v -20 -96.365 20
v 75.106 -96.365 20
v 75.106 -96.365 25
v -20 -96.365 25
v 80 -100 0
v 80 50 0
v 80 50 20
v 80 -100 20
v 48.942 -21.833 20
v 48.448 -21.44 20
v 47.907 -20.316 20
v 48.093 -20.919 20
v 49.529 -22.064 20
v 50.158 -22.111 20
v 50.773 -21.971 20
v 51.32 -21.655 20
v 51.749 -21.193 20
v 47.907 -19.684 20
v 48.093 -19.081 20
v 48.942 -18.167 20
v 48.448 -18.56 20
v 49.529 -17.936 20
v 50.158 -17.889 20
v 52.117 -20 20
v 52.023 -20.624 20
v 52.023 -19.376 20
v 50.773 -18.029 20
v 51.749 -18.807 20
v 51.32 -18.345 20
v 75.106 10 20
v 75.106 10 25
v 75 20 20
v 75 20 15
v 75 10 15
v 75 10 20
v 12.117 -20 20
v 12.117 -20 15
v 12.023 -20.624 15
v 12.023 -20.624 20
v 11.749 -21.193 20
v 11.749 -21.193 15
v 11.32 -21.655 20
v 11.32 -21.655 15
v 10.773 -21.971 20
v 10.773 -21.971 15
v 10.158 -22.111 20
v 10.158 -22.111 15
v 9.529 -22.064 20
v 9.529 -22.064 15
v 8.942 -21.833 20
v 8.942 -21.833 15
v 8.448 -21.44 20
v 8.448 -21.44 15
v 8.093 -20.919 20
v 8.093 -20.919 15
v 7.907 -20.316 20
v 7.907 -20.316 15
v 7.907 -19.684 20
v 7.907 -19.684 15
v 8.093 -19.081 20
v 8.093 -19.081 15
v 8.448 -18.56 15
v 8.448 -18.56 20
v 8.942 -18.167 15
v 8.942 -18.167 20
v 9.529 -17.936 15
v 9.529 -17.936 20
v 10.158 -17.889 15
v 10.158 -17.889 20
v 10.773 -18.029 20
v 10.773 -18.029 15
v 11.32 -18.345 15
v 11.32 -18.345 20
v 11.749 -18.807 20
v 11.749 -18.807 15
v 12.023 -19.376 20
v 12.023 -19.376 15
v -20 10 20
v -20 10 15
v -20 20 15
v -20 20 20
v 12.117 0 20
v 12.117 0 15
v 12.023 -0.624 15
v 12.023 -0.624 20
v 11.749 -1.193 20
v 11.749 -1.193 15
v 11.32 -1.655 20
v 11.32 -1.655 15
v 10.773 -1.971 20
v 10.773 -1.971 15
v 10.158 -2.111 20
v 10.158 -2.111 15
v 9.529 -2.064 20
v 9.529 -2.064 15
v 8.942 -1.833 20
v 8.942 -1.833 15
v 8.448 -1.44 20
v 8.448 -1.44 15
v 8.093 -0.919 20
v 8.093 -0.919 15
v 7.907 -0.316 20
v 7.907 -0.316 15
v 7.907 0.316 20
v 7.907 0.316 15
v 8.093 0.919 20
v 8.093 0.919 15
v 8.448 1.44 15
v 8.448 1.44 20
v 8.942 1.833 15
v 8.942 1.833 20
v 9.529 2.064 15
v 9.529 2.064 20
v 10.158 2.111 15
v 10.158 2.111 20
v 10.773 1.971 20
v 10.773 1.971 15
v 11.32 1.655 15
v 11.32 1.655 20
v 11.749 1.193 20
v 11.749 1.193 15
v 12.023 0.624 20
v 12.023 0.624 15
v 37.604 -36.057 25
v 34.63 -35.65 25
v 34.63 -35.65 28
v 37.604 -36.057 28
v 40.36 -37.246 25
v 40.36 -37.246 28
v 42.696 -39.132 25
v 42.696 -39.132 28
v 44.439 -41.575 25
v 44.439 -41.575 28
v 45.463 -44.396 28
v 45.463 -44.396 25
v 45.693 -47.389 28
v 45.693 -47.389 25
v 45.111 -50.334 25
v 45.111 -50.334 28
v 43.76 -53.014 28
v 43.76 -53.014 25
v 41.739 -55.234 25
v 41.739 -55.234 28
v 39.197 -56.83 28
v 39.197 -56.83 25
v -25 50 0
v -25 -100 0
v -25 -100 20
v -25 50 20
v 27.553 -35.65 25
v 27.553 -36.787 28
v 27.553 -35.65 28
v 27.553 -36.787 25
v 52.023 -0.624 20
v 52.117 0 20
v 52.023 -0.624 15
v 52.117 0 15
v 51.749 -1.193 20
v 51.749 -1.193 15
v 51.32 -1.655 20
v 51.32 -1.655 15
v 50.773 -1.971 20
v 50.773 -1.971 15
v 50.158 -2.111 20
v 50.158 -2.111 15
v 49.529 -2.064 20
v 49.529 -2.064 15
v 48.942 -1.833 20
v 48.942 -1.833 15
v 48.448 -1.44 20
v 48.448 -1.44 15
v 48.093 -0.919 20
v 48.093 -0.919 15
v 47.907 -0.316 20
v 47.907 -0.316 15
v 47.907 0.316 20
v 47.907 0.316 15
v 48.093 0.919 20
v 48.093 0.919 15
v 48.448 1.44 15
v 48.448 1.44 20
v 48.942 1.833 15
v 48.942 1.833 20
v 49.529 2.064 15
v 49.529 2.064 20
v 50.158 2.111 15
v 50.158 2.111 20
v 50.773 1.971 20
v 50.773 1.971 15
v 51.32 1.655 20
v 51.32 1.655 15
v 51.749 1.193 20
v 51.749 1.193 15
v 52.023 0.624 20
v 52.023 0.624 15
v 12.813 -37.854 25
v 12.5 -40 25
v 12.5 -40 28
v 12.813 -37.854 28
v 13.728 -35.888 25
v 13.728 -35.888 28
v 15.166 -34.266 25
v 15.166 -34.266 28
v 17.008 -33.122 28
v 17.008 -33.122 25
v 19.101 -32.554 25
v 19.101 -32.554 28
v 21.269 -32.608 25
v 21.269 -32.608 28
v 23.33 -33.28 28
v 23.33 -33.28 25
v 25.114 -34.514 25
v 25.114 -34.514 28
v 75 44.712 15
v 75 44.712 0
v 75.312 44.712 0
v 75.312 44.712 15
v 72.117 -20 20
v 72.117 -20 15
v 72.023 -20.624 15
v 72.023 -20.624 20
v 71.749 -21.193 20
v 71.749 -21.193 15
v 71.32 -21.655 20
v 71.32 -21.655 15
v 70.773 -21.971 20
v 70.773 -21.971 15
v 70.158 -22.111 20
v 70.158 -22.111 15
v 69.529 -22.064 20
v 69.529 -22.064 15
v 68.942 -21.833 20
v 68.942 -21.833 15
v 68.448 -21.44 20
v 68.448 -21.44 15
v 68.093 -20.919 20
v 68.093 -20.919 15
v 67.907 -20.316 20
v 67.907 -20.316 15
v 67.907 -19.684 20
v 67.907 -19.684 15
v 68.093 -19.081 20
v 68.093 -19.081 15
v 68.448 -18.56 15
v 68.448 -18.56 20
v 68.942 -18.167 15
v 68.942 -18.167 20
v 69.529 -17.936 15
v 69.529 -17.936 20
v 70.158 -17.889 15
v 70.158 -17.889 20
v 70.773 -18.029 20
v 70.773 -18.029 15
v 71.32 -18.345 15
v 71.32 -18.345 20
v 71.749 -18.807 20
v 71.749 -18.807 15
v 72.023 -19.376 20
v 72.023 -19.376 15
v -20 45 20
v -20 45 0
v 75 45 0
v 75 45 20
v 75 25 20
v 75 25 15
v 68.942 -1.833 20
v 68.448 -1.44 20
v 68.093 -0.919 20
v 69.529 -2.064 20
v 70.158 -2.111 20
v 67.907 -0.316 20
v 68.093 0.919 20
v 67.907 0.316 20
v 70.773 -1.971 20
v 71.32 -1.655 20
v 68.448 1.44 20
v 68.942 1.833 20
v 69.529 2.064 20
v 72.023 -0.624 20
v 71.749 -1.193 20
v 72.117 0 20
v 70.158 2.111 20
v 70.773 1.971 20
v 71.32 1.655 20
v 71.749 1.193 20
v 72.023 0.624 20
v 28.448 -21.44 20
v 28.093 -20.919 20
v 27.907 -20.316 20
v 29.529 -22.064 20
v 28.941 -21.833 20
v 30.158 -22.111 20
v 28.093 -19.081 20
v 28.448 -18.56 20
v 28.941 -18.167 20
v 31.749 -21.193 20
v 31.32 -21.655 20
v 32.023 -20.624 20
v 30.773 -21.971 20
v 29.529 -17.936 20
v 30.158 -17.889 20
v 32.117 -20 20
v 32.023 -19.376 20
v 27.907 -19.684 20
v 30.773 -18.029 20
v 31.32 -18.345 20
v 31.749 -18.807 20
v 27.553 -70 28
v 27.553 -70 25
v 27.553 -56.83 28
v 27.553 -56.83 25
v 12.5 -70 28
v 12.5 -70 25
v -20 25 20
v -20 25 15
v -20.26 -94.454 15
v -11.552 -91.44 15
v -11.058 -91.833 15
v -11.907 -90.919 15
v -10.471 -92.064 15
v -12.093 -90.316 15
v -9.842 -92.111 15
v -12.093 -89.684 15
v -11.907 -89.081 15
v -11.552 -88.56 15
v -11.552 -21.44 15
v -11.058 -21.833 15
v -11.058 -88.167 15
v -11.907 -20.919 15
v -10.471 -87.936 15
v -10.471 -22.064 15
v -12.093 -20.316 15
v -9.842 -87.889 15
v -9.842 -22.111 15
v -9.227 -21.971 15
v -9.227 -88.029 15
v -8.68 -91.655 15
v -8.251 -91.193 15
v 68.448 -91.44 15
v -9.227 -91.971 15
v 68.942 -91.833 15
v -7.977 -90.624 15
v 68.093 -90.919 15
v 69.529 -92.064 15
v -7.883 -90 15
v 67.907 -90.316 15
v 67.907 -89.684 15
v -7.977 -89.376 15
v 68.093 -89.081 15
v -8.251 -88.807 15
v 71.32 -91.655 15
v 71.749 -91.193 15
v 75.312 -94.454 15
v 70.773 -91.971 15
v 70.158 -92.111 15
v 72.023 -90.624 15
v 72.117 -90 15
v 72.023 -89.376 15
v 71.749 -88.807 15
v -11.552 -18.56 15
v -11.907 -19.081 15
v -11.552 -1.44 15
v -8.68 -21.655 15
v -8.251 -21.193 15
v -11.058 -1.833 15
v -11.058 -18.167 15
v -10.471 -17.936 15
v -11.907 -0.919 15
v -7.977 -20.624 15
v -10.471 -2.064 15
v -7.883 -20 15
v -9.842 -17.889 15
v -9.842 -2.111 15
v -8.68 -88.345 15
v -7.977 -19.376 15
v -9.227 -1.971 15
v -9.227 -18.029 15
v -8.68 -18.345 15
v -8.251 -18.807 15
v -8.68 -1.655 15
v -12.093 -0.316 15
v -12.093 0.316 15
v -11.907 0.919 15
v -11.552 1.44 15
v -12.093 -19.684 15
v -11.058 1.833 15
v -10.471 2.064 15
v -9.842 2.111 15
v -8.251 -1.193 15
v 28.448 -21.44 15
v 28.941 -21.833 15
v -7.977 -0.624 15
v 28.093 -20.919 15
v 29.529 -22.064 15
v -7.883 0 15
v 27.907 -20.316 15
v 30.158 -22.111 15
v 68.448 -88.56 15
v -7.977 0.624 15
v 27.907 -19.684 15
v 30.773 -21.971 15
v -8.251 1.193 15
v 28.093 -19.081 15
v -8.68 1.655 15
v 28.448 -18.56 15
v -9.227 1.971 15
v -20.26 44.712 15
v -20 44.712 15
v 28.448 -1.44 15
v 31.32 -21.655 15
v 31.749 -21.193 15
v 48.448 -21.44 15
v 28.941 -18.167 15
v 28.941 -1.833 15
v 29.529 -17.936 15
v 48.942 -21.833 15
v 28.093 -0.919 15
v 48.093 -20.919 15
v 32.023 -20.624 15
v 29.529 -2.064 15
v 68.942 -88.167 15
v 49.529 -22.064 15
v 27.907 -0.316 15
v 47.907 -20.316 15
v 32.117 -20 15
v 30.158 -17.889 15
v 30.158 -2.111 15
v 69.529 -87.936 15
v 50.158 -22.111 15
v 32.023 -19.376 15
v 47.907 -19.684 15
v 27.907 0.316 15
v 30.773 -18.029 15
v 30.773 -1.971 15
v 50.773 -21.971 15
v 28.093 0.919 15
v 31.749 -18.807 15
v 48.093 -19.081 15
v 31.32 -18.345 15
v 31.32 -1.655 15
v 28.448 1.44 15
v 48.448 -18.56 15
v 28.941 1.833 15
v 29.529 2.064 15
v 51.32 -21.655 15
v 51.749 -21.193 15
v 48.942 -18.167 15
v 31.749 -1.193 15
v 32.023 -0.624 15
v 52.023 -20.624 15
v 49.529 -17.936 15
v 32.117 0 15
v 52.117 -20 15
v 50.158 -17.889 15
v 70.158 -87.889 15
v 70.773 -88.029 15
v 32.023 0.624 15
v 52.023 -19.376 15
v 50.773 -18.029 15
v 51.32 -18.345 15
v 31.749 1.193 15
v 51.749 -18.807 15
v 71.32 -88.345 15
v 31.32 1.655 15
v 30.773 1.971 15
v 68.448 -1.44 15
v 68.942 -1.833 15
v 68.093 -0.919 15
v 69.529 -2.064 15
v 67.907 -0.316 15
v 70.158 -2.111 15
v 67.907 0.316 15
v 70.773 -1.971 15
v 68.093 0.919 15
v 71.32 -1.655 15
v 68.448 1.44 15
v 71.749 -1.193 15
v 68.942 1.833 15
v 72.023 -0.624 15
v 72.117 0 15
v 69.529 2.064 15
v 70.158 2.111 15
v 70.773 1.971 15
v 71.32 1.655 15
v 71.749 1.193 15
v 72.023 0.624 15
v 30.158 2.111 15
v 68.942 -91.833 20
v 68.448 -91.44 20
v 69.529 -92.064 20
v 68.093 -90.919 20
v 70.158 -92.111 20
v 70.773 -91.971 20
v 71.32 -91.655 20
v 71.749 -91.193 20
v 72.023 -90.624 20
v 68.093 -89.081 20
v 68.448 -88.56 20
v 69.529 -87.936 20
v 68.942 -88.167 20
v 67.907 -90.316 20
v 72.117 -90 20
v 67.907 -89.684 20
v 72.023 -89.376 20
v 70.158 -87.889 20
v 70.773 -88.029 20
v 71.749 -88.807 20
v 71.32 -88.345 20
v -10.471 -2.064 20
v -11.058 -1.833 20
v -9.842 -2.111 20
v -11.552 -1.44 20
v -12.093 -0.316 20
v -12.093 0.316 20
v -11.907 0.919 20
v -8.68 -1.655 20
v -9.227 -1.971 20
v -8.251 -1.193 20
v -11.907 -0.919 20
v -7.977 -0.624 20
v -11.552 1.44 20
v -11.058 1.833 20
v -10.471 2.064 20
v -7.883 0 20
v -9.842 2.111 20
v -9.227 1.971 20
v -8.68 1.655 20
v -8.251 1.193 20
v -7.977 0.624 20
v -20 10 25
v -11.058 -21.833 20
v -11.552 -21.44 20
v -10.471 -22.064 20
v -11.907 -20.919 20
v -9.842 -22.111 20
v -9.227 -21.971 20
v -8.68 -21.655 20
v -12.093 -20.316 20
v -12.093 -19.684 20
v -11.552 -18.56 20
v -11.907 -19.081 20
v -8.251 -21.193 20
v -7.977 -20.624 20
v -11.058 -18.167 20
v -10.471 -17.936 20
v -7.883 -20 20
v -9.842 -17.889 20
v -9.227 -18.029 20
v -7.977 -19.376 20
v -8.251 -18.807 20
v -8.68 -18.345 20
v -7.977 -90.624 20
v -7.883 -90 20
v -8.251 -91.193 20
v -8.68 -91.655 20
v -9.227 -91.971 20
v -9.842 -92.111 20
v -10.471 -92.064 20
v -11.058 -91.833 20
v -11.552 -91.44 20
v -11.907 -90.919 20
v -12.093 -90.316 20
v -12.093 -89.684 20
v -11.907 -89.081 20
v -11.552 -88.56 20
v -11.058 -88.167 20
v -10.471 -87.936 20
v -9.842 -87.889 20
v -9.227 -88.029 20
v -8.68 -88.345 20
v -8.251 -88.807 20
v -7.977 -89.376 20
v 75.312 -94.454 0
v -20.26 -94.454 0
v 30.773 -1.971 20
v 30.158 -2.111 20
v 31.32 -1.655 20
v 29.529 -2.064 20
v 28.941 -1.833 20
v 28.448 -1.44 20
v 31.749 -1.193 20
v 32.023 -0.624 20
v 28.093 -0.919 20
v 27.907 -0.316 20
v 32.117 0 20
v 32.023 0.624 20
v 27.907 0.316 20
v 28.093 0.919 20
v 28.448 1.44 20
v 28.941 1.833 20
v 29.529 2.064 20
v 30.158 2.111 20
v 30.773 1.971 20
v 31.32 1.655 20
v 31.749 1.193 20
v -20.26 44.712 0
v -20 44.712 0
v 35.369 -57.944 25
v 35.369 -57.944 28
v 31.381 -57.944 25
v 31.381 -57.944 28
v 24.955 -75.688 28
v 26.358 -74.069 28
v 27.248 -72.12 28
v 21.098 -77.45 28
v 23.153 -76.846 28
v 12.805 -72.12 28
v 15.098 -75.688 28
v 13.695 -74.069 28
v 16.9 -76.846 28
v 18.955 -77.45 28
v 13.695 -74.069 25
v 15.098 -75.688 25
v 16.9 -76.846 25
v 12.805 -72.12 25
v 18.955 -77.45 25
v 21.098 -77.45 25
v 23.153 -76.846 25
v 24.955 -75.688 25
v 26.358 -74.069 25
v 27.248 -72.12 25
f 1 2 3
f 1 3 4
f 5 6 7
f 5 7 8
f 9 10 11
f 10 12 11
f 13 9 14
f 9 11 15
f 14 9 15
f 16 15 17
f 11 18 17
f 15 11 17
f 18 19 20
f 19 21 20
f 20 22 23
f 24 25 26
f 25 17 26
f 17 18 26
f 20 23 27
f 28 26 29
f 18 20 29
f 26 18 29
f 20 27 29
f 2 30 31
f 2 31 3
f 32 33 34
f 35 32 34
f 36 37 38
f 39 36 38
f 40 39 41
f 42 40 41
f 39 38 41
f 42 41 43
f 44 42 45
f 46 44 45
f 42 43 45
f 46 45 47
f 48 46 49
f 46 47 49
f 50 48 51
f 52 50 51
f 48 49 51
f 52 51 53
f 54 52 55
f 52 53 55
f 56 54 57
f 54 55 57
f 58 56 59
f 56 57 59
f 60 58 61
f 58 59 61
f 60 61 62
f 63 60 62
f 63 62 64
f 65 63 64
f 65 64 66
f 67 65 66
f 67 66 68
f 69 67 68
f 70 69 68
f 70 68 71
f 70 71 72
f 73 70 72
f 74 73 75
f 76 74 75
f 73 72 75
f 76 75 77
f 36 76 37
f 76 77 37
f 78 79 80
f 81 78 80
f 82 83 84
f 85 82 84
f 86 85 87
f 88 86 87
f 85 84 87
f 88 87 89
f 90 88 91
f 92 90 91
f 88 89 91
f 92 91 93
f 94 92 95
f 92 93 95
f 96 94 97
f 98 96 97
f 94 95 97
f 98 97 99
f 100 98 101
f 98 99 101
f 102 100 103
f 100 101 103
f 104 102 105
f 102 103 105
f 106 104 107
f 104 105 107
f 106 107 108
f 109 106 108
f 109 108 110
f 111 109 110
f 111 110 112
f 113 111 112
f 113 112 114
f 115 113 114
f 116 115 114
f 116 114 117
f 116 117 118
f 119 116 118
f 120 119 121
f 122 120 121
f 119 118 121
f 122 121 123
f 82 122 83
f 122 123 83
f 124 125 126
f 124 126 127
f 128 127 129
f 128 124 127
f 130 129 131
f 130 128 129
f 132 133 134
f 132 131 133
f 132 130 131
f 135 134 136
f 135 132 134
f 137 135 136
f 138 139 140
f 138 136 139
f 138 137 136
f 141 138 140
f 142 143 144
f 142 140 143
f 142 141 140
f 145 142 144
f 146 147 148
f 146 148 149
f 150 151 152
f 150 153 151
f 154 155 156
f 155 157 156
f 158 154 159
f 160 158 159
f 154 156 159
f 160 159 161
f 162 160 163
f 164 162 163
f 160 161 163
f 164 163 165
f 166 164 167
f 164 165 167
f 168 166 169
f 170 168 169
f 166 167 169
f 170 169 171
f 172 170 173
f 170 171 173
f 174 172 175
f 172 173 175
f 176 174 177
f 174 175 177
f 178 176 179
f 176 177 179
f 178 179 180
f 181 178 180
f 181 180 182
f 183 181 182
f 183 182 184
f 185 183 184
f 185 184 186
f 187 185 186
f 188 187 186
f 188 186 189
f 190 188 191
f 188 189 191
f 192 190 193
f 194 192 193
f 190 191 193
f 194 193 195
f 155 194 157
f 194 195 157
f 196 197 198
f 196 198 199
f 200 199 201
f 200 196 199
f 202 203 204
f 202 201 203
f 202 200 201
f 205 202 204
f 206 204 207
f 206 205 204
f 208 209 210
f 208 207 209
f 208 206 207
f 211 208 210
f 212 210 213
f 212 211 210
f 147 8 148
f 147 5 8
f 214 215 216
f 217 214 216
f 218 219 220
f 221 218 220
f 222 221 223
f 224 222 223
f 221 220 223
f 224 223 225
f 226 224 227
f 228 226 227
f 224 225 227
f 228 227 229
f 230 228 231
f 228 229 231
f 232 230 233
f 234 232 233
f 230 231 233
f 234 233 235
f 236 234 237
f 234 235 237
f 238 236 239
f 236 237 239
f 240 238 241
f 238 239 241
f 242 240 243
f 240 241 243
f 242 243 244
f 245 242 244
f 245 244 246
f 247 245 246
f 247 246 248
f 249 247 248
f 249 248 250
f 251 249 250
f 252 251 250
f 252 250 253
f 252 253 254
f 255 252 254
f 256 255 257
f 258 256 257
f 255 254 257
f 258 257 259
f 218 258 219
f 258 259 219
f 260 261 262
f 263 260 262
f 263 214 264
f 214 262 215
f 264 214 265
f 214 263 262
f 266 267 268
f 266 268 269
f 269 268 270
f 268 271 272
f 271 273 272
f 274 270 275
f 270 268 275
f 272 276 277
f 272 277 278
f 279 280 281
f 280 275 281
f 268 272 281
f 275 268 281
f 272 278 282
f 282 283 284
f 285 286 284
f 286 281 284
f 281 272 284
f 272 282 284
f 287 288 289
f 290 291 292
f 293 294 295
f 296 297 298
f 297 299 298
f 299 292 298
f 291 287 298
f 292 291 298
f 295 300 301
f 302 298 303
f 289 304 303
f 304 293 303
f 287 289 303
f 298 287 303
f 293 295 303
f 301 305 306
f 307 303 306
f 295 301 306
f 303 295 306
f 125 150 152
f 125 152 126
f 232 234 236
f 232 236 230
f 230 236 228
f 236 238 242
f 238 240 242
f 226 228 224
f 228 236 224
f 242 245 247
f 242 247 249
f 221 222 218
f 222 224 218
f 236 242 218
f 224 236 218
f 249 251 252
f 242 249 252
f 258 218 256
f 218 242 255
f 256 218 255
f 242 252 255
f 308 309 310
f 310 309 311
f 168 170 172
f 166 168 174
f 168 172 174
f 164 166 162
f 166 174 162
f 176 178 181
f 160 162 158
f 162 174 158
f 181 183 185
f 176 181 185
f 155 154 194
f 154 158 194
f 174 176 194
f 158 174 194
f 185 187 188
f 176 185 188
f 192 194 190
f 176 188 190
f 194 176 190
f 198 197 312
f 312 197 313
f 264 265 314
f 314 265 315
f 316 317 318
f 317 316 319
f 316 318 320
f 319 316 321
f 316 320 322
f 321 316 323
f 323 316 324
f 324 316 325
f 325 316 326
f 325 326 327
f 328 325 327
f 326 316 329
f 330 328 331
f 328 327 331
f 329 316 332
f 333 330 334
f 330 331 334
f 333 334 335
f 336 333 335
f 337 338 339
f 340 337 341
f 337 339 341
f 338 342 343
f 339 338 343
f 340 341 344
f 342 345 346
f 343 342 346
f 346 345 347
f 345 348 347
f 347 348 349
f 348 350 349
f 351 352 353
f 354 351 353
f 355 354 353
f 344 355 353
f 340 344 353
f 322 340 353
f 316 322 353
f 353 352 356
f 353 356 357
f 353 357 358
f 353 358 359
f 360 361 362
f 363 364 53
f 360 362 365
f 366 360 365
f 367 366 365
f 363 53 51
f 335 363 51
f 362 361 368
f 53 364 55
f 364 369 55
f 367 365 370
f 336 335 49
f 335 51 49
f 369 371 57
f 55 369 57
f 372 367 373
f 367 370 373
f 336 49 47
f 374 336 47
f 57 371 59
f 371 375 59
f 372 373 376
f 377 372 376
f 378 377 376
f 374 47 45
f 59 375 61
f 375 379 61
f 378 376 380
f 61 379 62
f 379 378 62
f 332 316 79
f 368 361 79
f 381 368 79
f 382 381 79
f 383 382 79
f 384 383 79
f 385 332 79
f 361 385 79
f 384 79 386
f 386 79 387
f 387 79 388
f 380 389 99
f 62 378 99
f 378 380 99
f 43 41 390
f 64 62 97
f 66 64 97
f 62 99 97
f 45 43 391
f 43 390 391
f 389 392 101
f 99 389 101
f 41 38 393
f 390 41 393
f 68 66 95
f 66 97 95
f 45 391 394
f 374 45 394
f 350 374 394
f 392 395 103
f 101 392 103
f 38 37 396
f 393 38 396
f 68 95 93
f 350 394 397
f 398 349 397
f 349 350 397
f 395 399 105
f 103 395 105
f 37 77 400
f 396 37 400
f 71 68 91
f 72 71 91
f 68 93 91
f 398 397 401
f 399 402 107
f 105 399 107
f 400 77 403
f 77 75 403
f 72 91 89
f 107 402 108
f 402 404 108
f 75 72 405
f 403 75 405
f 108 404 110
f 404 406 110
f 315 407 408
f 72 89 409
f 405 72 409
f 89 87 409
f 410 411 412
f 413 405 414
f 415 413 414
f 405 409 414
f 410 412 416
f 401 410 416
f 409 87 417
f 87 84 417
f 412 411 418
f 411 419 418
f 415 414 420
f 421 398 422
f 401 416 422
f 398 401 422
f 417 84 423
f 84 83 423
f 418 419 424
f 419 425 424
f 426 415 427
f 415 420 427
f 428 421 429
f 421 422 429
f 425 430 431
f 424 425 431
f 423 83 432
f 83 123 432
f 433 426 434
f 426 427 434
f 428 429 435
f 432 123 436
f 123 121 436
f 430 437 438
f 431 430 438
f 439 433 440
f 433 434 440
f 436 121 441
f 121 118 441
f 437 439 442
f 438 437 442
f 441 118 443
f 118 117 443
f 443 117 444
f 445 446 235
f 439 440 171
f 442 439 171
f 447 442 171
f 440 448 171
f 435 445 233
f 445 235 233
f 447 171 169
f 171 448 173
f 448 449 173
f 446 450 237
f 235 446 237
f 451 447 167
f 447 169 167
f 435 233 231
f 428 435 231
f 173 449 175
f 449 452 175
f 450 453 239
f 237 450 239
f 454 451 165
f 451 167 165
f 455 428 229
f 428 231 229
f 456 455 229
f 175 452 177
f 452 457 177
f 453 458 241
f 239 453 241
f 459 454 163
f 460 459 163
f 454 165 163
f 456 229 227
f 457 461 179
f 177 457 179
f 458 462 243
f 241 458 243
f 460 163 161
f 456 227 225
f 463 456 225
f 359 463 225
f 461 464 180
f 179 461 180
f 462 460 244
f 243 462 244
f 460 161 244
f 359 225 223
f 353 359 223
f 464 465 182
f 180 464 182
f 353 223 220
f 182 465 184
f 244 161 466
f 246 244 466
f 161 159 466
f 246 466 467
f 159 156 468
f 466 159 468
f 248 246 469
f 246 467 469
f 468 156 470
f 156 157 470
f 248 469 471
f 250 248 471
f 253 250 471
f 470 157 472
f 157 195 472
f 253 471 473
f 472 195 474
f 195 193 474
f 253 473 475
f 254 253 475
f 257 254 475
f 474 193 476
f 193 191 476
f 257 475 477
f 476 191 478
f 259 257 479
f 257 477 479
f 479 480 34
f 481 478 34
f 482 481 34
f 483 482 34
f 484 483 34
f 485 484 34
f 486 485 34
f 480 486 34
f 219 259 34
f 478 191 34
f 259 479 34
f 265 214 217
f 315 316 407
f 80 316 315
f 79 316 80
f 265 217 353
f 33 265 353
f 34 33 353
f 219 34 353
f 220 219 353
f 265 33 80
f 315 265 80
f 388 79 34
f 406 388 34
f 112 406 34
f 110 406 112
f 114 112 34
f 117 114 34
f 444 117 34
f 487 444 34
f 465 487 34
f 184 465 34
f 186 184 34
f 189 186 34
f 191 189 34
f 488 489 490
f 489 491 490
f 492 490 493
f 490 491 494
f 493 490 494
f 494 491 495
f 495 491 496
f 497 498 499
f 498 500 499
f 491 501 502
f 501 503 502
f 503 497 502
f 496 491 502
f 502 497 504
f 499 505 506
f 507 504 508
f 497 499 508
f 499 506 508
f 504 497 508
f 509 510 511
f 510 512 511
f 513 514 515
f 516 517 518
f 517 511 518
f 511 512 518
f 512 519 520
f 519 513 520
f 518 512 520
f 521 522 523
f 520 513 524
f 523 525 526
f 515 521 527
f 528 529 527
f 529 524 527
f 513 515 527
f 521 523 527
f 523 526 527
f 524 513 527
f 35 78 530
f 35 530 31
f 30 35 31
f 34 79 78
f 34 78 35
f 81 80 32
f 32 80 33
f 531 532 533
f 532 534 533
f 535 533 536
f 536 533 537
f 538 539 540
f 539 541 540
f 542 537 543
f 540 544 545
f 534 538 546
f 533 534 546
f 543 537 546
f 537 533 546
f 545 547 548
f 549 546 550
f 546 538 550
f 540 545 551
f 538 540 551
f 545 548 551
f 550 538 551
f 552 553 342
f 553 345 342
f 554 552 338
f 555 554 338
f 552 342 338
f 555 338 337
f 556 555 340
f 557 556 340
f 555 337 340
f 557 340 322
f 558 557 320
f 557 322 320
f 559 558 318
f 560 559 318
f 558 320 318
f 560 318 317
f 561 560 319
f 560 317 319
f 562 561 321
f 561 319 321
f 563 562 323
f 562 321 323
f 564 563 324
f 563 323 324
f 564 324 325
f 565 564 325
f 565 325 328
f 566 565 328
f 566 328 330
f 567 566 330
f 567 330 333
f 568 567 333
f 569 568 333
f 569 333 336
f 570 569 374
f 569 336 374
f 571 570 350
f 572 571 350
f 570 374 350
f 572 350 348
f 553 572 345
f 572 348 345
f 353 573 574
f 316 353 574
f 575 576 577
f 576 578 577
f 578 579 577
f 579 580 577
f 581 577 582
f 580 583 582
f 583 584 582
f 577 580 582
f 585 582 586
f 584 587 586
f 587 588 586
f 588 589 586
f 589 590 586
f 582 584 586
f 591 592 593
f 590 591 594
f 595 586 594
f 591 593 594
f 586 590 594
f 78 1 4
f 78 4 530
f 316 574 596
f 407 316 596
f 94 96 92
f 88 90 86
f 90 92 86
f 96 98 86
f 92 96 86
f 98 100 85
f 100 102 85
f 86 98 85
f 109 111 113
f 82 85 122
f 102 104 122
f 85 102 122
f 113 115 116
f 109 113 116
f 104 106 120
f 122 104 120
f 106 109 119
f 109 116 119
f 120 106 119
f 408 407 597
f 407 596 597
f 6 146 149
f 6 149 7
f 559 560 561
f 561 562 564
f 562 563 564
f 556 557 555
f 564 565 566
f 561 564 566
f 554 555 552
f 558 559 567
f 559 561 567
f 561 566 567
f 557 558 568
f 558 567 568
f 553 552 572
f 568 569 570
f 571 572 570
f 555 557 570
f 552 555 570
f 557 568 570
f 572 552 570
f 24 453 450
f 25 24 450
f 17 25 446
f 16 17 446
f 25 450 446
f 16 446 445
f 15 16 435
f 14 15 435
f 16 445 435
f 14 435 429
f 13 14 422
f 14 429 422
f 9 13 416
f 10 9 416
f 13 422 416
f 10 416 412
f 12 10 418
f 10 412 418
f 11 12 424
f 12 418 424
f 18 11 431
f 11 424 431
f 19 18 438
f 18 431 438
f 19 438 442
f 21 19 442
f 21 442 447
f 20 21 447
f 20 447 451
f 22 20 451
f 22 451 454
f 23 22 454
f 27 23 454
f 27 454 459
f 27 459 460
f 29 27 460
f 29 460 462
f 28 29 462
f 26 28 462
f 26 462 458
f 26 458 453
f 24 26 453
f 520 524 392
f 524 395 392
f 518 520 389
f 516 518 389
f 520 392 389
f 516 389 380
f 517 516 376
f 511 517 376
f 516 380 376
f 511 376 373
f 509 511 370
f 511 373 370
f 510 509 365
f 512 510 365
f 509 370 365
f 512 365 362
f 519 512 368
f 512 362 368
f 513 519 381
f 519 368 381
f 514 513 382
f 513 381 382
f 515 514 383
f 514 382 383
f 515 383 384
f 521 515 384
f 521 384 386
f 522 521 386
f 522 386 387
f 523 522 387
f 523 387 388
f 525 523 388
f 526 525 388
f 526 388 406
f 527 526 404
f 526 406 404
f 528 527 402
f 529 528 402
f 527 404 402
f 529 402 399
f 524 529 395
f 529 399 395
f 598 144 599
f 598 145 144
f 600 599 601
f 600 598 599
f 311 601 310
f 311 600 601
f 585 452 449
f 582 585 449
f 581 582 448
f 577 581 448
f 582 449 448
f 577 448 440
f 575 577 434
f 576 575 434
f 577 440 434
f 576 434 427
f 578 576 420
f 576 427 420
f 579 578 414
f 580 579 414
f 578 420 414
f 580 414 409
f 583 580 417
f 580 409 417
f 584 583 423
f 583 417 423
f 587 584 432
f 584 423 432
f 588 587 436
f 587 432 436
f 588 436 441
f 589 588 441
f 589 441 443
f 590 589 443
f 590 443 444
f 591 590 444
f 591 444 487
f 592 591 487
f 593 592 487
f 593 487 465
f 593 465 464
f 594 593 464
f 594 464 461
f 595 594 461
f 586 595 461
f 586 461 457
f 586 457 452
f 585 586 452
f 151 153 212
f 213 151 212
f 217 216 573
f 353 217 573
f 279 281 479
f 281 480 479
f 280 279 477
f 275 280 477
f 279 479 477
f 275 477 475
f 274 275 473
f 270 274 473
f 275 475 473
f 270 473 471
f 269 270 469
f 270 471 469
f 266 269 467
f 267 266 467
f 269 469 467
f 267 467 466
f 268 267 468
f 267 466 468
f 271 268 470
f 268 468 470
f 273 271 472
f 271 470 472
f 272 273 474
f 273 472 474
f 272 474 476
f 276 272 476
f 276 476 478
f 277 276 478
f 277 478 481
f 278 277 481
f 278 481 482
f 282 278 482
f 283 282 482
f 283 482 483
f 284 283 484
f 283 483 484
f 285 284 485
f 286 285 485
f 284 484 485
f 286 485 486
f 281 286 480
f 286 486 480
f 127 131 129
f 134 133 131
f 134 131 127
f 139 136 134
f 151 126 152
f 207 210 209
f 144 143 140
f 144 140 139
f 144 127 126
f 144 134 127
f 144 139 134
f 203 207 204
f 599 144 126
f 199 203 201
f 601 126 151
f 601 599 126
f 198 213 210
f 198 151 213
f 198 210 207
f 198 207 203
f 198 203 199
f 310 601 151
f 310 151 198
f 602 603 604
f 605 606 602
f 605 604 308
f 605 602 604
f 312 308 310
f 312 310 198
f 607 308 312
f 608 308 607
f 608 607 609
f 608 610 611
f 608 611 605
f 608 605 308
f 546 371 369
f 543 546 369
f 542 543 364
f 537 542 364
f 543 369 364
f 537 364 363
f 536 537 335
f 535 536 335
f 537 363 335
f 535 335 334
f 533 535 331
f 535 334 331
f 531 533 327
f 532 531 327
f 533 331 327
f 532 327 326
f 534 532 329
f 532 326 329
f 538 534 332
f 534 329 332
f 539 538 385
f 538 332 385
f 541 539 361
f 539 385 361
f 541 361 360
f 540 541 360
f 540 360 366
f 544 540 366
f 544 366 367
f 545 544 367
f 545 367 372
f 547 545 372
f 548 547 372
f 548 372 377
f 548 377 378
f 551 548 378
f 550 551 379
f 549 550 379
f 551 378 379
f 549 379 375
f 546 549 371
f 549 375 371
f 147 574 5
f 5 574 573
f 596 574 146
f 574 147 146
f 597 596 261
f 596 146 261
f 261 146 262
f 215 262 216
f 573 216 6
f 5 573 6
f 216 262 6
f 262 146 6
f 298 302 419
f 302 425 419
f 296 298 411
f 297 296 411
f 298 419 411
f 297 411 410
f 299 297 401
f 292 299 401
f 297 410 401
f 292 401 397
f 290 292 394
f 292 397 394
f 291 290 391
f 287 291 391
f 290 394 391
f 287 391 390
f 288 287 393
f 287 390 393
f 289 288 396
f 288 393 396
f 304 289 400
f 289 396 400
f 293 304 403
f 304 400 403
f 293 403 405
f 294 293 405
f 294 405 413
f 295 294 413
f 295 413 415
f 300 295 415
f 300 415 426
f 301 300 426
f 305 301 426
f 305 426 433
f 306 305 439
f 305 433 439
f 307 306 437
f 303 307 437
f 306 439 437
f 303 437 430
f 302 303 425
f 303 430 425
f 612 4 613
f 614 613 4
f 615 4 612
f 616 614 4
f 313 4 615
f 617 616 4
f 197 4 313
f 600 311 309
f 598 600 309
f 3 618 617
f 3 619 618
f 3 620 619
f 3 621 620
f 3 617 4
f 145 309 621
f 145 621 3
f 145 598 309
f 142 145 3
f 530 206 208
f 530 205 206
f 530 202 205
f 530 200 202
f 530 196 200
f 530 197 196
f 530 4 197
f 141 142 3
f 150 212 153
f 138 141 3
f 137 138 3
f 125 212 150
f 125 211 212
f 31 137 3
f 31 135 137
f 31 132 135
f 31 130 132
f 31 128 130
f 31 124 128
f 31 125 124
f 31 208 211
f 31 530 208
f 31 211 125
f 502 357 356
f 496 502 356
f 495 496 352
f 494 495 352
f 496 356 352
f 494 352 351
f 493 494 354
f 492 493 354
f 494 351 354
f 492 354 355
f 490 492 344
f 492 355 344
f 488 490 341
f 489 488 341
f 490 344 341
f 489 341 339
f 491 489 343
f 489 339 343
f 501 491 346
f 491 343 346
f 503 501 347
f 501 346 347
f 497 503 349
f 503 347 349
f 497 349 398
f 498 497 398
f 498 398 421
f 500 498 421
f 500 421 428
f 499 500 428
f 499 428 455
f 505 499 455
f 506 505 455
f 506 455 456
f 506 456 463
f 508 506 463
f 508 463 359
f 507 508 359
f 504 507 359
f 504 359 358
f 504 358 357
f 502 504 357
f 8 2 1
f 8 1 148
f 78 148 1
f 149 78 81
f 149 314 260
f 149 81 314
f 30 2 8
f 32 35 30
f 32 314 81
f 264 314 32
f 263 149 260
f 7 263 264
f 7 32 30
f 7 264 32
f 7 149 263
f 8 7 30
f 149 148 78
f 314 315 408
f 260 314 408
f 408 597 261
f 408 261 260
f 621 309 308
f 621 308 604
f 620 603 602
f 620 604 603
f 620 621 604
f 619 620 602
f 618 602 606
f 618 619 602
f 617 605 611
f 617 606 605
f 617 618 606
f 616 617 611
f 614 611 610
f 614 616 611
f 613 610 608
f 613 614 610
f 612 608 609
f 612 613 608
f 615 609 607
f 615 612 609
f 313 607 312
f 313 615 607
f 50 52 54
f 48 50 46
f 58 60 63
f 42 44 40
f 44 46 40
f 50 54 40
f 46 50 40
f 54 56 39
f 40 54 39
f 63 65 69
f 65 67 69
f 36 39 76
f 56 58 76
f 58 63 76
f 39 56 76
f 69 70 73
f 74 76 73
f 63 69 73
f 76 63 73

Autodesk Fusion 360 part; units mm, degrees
sketch "Sketch1" plane through (0, 0, 0) normal (0, 0, 1) x (1, 0, 0)
  line L0 (-25, 50) -> (80, 50)
  line L1 (80, 50) -> (80, -100)
  line L2 (80, -100) -> (-25, -100)
  line L3 (-25, -100) -> (-25, 50)
  line L4 (-20, 45) -> (75, 45)
  line L5 (75, 45) -> (75, 25)
  line L6 (75, 25) -> (-20, 25)
  line L7 (-20, 25) -> (-20, 45)
  line L8 (-20, 20) -> (75, 20)
  line L9 (75, 20) -> (75, 10)
  line L10 (75, 10) -> (-20, 10)
  line L11 (-20, 10) -> (-20, 20)
  dimension "d1" = 105
  dimension "d2" = 150
extrude "Extrude1" add sketch "Sketch1" along normal blind 20 makes body 1
sketch "Sketch2" plane through (0, 0, 0) normal (0, 0, 1) x (1, 0, 0)
  line L0 (-20.26, 44.7118) -> (75.3115, 44.7118)
  line L1 (75.3115, 44.7118) -> (75.3115, -94.4537)
  line L2 (75.3115, -94.4537) -> (-20.26, -94.4537)
  line L3 (-20.26, -94.4537) -> (-20.26, 44.7118)
extrude "Extrude2" cut sketch "Sketch2" along normal blind 15 bodies 1
sketch "Sketch3" plane through (0, 0, 0) normal (0, 0, 1) x (1, 0, 0)
  circle A0 centre (70, 0) radius 2.5
  circle A1 centre (-10, 0) radius 2.5
  circle A2 centre (70, -90) radius 2.5
  circle A3 centre (-10, -90) radius 2.5
  circle A4 centre (50, 0) radius 2.5
  circle A5 centre (50, -20) radius 2.5
  circle A6 centre (70, -20) radius 2.5
  circle A7 centre (10, 0) radius 2.5
  circle A8 centre (-10, -20) radius 2.5
  circle A9 centre (10, -20) radius 2.5
  circle A10 centre (30, 0) radius 2.5
  circle A11 centre (30, -20) radius 2.5
  dimension "d7" = 5
  dimension "d8" = 5
  dimension "d9" = 5
  dimension "d10" = 5
  dimension "d11" = 5
  dimension "d12" = 5
  dimension "d13" = 5
  dimension "d14" = 5
  dimension "d15" = 5
  dimension "d16" = 5
  dimension "d17" = 5
  dimension "d18" = 5
extrude "Extrude3" cut sketch "Sketch3" along normal blind 40 bodies 1
thread "Thread1" "ISO Metric profile 5.0 M5x0.8 M5x0.8 6H" major diameter 5.12 minor diameter 4.234 pitch 0.8 angle 60 resizes the face on face at (72.4969, -19.8754, 16.6667) on bodies 1
thread "Thread2" "ISO Metric profile 5.0 M5x0.8 M5x0.8 6H" major diameter 5.12 minor diameter 4.234 pitch 0.8 angle 60 resizes the face on face at (52.4969, -19.8754, 16.6667) on bodies 1
thread "Thread3" "ISO Metric profile 5.0 M5x0.8 M5x0.8 6H" major diameter 5.12 minor diameter 4.234 pitch 0.8 angle 60 resizes the face on face at (32.4969, -19.8754, 16.6667) on bodies 1
thread "Thread4" "ISO Metric profile 5.0 M5x0.8 M5x0.8 6H" major diameter 5.12 minor diameter 4.234 pitch 0.8 angle 60 resizes the face on face at (32.4876, 0.2489, 18.3333) on bodies 1
thread "Thread5" "ISO Metric profile 5.0 M5x0.8 M5x0.8 6H" major diameter 5.12 minor diameter 4.234 pitch 0.8 angle 60 resizes the face on face at (12.4876, 0.2489, 18.3333) on bodies 1
thread "Thread6" "ISO Metric profile 5.0 M5x0.8 M5x0.8 6H" major diameter 5.12 minor diameter 4.234 pitch 0.8 angle 60 resizes the face on face at (-7.5124, 0.2489, 18.3333) on bodies 1
thread "Thread7" "ISO Metric profile 5.0 M5x0.8 M5x0.8 6H" major diameter 5.12 minor diameter 4.234 pitch 0.8 angle 60 resizes the face on face at (-7.5031, -19.8754, 16.6667) on bodies 1
thread "Thread8" "ISO Metric profile 5.0 M5x0.8 M5x0.8 6H" major diameter 5.12 minor diameter 4.234 pitch 0.8 angle 60 resizes the face on face at (12.4969, -19.8754, 16.6667) on bodies 1
thread "Thread9" "ISO Metric profile 5.0 M5x0.8 M5x0.8 6H" major diameter 5.12 minor diameter 4.234 pitch 0.8 angle 60 resizes the face on face at (52.4876, 0.2489, 18.3333) on bodies 1
thread "Thread10" "ISO Metric profile 5.0 M5x0.8 M5x0.8 6H" major diameter 5.12 minor diameter 4.234 pitch 0.8 angle 60 resizes the face on face at (72.4876, 0.2489, 18.3333) on bodies 1
thread "Thread11" "ISO Metric profile 5.0 M5x0.8 M5x0.8 6H" major diameter 5.12 minor diameter 4.234 pitch 0.8 angle 60 resizes the face on face at (67.6508, -89.1449, 18.3333) on bodies 1
thread "Thread12" "ISO Metric profile 5.0 M5x0.8 M5x0.8 6H" major diameter 5.12 minor diameter 4.234 pitch 0.8 angle 60 resizes the face on face at (-12.3492, -89.1449, 18.3333) on bodies 1
sketch "Sketch4" plane through (0, 0, 0) normal (0, 0, 1) x (1, 0, 0)
  line L0 (-20, 10) -> (75.1056, 10)
  line L1 (75.1056, 10) -> (75.1056, -96.3646)
  line L2 (75.1056, -96.3646) -> (-20, -96.3646)
  line L3 (-20, -96.3646) -> (-20, 10)
extrude "Extrude1'" add sketch "Sketch4" along normal blind 10 separate body makes body 2 in component "Component"
move_body "Move1" bodies 2 to x (1, 0, 0) y (0, 1, 0) z (0, 0, 1) at (0, 0, 20) in component "Component"
extrude "Extrude2'" cut 1 faces at (43.4037, -60.9097, 30) along direction (0, 0, -1) blind 5 on bodies 2 bodies 2 in component "Component"
combine "Combine1" operation add target body 1 tool bodies 2
sketch "Sketch5" plane through (0, 0, 25) normal (0, 0, 1) x (-1, 0, 0)
  line L0 (20, 96.3646) -> (-75.1056, 96.3646)
  line L1 (-75.1056, 96.3646) -> (-75.1056, -10)
  line L2 (-75.1056, -10) -> (20, -10)
  line L3 (20, -10) -> (20, 96.3646)
  circle A0 centre (-20, 40) radius 7.5
  line L4 (-12.5, 40) -> (-12.5, 70)
  arc A1 (-12.5, 70) -> (-27.5528, 70) centre (-20.0264, 70) ccw
  line L5 (-27.5528, 70) -> (-27.5528, 36.787)
  line L6 (-27.5528, 36.787) -> (-25.1136, 34.5135)
  line L7 (-27.5528, 35.6503) -> (-34.6305, 35.6503)
  arc A2 (-39.1972, 56.8295) -> (-34.6305, 35.6503) centre (-34.6305, 46.7322) ccw
  arc A3 (-27.5528, 56.8295) -> (-39.1972, 56.8295) centre (-33.375, 43.9561) ccw
  line L8 (-27.5528, 36.787) -> (-27.5528, 56.8295)
  line L9 (-27.5528, 56.8295) -> (-27.5528, 35.6503)
  dimension "d49" = 15
extrude "Extrude4" add sketch "Sketch5" along normal blind 3 contours A0 | A0 L4 A1 L5 L6 L8 L9 | L5 L7 A2 A3 L8 L9 bodies 1
component "Component" placed x (1, 0, 0) y (0, 1, 0) z (0, 0, 1) at (0, 0, 0)
